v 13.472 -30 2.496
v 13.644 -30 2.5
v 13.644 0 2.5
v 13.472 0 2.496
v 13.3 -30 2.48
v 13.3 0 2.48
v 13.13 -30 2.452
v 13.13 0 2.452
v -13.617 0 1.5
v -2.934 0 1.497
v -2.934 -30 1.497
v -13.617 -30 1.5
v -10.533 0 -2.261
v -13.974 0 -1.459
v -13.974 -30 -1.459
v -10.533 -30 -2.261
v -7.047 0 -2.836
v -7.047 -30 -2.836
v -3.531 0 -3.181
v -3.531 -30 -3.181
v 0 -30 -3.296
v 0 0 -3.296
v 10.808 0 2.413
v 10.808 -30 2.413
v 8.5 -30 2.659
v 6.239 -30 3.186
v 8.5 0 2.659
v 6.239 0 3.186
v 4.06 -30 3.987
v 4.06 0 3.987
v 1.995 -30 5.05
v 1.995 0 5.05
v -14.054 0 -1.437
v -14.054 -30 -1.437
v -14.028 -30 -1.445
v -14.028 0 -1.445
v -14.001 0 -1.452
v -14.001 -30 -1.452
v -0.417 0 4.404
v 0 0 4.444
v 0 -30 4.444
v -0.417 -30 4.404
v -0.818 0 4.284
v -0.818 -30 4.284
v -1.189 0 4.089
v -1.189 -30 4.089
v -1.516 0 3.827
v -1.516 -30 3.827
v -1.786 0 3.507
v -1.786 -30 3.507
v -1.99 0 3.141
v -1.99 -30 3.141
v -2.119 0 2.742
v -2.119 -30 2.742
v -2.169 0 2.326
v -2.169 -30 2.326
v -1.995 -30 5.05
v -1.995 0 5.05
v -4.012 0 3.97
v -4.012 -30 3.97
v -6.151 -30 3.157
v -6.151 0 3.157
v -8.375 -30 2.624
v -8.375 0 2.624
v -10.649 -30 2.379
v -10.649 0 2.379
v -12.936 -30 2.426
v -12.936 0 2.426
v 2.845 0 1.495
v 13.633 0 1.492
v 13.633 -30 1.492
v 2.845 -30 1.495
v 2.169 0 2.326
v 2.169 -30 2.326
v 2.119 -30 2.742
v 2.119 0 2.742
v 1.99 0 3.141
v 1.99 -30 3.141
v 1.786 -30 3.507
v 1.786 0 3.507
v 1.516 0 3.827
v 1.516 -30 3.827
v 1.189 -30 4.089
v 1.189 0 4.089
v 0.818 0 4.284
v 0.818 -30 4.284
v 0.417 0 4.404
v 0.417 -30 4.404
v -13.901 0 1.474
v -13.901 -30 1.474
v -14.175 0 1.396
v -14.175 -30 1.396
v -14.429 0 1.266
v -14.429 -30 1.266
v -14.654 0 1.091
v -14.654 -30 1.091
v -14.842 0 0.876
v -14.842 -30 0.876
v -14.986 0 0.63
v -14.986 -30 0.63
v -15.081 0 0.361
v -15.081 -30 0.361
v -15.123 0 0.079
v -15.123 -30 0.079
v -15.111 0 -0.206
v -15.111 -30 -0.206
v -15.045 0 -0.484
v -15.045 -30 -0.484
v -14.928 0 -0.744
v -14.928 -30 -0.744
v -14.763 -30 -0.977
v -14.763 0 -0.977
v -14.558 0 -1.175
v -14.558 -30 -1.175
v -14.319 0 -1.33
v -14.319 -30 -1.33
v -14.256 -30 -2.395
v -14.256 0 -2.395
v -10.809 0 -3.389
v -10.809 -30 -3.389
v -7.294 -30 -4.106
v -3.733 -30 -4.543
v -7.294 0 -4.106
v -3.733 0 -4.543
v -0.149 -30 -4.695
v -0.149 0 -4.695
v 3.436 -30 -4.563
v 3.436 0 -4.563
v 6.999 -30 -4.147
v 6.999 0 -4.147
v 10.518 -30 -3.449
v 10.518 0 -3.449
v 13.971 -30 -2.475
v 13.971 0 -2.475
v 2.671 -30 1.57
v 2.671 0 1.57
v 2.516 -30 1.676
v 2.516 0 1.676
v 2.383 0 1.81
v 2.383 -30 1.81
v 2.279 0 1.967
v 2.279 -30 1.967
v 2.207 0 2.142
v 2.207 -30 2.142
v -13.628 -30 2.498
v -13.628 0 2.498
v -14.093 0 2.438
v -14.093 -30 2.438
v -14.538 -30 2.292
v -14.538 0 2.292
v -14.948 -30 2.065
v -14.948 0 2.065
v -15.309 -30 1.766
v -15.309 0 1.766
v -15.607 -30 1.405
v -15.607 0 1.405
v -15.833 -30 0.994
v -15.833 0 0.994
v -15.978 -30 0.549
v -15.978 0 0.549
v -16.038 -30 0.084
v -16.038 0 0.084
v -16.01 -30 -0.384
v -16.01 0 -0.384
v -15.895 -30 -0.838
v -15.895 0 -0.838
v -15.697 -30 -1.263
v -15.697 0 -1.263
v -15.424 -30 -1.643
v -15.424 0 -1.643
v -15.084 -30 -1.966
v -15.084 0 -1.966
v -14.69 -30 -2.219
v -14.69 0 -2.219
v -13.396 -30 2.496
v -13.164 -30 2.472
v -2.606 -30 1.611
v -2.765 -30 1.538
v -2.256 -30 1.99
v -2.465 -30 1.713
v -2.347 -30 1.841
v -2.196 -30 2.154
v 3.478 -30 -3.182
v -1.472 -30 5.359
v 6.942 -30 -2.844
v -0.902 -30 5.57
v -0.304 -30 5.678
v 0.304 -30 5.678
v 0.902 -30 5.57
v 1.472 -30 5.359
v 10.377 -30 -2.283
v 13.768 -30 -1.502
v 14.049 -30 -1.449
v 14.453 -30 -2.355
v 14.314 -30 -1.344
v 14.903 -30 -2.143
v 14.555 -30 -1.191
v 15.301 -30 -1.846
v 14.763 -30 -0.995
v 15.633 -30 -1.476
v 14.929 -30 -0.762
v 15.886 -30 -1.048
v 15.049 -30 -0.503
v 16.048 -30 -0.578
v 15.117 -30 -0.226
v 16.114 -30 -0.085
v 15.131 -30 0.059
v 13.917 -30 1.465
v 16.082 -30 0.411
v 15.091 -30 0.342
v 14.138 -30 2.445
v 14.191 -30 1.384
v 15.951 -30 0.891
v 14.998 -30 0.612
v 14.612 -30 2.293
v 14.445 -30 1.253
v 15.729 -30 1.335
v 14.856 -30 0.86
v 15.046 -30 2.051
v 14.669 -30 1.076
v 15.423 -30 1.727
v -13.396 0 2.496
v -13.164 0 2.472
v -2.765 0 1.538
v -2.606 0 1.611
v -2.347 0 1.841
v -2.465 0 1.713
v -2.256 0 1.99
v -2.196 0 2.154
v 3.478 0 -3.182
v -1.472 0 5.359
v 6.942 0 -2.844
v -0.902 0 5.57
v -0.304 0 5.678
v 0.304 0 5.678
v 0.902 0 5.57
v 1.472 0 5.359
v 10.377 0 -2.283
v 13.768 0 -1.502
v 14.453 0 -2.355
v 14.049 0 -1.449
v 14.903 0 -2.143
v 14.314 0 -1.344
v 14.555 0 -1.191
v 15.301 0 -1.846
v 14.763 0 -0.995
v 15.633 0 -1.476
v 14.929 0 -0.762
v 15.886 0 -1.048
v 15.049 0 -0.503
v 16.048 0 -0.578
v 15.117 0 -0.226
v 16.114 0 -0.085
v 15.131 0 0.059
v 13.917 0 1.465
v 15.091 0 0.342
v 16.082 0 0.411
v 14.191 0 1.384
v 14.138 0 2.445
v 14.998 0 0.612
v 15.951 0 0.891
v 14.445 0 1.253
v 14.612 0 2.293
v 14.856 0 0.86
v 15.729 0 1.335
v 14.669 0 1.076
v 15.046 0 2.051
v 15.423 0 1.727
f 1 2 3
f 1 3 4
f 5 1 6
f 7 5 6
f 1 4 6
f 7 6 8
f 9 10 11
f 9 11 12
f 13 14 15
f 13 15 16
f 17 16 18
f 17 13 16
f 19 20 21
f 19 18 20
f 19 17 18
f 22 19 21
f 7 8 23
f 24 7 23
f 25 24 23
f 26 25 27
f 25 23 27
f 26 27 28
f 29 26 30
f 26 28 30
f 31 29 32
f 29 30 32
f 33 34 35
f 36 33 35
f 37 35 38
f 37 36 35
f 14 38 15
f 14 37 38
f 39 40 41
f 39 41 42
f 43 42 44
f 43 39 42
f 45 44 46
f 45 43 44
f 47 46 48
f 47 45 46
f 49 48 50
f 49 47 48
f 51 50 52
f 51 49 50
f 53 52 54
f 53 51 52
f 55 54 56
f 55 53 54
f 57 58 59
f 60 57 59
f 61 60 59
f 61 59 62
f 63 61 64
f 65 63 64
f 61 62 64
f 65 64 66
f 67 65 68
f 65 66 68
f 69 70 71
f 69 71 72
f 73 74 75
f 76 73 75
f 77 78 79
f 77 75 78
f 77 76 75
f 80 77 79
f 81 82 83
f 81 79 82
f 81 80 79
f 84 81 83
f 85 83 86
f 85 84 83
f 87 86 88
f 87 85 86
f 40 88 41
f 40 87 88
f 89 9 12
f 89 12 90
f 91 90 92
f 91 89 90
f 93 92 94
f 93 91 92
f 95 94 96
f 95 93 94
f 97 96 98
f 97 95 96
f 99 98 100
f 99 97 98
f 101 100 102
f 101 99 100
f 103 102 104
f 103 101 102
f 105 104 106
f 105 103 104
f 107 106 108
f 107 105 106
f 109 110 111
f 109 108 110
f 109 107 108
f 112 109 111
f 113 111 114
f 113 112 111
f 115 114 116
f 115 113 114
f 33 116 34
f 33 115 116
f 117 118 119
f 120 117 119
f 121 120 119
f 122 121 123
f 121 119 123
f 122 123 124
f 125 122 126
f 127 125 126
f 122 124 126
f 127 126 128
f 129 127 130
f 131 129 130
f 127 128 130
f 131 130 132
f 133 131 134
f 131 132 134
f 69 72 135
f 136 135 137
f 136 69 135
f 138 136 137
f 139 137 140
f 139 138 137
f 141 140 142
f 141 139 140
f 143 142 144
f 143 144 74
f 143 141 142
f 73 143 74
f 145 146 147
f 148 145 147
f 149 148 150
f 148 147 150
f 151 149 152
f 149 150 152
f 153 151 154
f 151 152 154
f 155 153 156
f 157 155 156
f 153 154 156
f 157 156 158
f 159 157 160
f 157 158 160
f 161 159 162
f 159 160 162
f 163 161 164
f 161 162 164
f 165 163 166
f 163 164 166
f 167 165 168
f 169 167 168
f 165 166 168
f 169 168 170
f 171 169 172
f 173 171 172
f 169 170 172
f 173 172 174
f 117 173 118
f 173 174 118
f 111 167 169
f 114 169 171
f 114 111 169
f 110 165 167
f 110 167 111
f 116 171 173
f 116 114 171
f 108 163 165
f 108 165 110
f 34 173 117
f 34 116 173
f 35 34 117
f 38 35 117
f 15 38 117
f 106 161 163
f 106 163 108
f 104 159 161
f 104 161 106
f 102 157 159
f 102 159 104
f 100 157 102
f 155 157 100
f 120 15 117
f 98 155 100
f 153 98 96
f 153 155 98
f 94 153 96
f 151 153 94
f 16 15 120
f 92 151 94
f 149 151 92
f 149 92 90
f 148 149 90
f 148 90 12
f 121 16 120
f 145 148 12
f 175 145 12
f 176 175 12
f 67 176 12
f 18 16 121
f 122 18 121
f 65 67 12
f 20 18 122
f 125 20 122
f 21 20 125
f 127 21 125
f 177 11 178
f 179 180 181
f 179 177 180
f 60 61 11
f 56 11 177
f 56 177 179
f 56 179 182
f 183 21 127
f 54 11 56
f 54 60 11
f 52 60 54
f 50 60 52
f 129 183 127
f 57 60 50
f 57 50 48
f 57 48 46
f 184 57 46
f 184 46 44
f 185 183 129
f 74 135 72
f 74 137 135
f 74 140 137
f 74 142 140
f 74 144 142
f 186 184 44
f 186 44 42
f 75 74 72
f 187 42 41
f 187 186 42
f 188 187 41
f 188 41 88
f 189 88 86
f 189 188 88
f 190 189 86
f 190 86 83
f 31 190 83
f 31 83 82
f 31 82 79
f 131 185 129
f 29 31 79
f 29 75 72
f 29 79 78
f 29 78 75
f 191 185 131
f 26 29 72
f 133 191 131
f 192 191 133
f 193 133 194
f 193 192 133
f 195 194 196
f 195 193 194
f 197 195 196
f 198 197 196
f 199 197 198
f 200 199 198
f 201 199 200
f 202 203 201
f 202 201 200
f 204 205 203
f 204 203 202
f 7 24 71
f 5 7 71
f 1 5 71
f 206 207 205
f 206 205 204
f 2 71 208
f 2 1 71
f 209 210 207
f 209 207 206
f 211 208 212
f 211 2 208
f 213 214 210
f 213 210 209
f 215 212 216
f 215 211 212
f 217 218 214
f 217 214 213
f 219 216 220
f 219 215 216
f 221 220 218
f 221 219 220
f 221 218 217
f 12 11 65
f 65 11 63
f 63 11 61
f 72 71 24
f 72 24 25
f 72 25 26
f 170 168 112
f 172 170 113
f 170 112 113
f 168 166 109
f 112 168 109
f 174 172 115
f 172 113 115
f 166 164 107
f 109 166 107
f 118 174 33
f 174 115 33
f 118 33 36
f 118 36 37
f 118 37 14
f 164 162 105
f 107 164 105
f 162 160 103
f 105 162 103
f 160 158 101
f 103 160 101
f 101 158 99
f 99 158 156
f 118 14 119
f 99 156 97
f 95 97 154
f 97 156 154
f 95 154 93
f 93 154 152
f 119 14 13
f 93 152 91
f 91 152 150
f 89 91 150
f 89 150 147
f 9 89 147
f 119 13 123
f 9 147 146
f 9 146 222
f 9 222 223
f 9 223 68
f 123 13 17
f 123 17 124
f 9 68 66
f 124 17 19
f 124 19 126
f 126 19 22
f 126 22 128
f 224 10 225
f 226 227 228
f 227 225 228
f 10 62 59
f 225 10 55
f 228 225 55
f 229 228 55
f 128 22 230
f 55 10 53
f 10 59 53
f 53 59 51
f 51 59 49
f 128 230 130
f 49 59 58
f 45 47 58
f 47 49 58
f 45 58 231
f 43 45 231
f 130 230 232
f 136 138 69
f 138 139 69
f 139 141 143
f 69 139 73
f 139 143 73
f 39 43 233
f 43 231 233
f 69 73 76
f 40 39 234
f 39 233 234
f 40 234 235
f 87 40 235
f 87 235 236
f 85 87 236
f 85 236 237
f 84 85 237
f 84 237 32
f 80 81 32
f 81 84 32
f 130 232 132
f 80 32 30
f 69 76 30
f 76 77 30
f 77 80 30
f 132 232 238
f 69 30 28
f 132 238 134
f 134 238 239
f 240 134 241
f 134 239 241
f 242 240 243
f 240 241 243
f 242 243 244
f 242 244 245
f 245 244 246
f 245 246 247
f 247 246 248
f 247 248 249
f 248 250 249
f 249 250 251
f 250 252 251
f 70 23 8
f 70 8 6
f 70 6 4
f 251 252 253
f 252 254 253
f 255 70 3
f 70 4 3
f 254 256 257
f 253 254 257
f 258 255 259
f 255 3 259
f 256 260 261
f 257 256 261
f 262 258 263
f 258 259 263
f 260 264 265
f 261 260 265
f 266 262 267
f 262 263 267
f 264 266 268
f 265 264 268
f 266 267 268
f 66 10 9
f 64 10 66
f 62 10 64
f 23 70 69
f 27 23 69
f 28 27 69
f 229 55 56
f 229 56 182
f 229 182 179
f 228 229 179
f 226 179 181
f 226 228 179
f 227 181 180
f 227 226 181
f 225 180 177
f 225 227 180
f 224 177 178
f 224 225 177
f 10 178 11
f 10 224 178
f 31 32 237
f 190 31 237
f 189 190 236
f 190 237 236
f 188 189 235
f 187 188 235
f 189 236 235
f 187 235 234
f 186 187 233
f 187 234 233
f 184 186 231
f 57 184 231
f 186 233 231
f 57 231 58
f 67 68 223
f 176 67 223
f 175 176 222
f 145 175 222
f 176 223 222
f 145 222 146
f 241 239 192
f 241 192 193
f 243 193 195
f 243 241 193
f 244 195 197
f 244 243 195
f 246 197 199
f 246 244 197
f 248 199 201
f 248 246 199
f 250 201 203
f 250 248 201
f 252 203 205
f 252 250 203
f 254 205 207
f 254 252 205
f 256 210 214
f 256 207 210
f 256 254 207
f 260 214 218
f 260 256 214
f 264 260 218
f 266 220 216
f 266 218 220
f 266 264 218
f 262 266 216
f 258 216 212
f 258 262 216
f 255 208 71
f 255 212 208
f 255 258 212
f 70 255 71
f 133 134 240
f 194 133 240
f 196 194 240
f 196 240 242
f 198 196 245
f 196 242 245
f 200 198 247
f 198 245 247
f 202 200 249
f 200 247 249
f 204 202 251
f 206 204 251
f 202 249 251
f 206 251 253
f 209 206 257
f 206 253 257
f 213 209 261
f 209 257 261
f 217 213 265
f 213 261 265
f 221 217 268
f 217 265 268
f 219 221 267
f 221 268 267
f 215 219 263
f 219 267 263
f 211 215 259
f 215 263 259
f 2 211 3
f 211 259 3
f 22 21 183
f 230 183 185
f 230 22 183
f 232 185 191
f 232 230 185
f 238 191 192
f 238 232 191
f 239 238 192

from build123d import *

# Parameters (mm, degrees)
F2_DEPTH = 30
F3_DEPTH = 30.001


with BuildPart() as f2:
    # F1 (on Front) → F2 (new body)
    with BuildSketch(Plane.XZ):
        with BuildLine():
            ThreePointArc((-13.628092, 2.498427), (-13.282564, 2.458935), (-12.936335, 2.42617))
            ThreePointArc((-12.936335, 2.42617), (-13.279688, 2.486472), (-13.628092, 2.498427))
        make_face()
        with BuildLine():
            ThreePointArc((-1.995452, 5.049623), (-7.254227, 2.855159), (-12.936335, 2.42617))
            ThreePointArc((-12.936335, 2.42617), (-13.282564, 2.458935), (-13.628092, 2.498427))
            ThreePointArc((-13.628092, 2.498427), (-16.019104, 0.317987), (-14.255634, -2.395208))
            ThreePointArc((-14.255634, -2.395208), (-0.148783, -4.695078), (13.970789, -2.474639))
            ThreePointArc((13.970789, -2.474639), (16.110221, 0.163832), (13.644095, 2.499838))
            ThreePointArc((13.644095, 2.499838), (13.386962, 2.474302), (13.129503, 2.452288))
            ThreePointArc((13.129503, 2.452288), (7.36113, 2.887834), (1.995452, 5.049623))
            ThreePointArc((1.995452, 5.049623), (0, 5.691083), (-1.995452, 5.049623))
        make_face()
        with BuildLine():
            ThreePointArc((13.644095, 2.499838), (13.385567, 2.489395), (13.129503, 2.452288))
            ThreePointArc((13.129503, 2.452288), (13.386962, 2.474302), (13.644095, 2.499838))
        make_face()
    extrude(amount=F2_DEPTH)

    # F0 (on Front) → F3 (cut, through all)
    with BuildSketch(Plane.XZ):
        with BuildLine():
            Line((-2.934361, 1.4968), (-13.616795, 1.499978))
            ThreePointArc((-13.616795, 1.499978), (-15.108627, 0.221025), (-14.054368, -1.437234))
            ThreePointArc((-14.054368, -1.437234), (-14.014174, -1.448054), (-13.973971, -1.458842))
            ThreePointArc((-13.973971, -1.458842), (-7.047266, -2.835816), (0, -3.295535))
            Line((0, -3.295535), (0, 4.444465))
            ThreePointArc((0, 4.444465), (-1.516001, 3.827089), (-2.169382, 2.326253))
            ThreePointArc((-2.169382, 2.326253), (-2.403217, 1.774428), (-2.934361, 1.4968))
        make_face()
        with BuildLine():
            ThreePointArc((-13.973971, -1.458842), (-14.014174, -1.448054), (-14.054368, -1.437234))
            ThreePointArc((-14.054368, -1.437234), (-14.014319, -1.448596), (-13.973971, -1.458842))
        make_face()
        with BuildLine():
            Line((0, 4.444465), (0, -3.295535))
            ThreePointArc((0, -3.295535), (6.942098, -2.843865), (13.768233, -1.501997))
            ThreePointArc((13.768233, -1.501997), (15.131236, 0.059457), (13.633205, 1.491873))
            Line((13.633205, 1.491873), (2.844597, 1.495082))
            ThreePointArc((2.844597, 1.495082), (2.383494, 1.810344), (2.169382, 2.326253))
            ThreePointArc((2.169382, 2.326253), (1.516001, 3.827089), (0, 4.444465))
        make_face()
    extrude(amount=F3_DEPTH, mode=Mode.SUBTRACT)


solid = f2.part
